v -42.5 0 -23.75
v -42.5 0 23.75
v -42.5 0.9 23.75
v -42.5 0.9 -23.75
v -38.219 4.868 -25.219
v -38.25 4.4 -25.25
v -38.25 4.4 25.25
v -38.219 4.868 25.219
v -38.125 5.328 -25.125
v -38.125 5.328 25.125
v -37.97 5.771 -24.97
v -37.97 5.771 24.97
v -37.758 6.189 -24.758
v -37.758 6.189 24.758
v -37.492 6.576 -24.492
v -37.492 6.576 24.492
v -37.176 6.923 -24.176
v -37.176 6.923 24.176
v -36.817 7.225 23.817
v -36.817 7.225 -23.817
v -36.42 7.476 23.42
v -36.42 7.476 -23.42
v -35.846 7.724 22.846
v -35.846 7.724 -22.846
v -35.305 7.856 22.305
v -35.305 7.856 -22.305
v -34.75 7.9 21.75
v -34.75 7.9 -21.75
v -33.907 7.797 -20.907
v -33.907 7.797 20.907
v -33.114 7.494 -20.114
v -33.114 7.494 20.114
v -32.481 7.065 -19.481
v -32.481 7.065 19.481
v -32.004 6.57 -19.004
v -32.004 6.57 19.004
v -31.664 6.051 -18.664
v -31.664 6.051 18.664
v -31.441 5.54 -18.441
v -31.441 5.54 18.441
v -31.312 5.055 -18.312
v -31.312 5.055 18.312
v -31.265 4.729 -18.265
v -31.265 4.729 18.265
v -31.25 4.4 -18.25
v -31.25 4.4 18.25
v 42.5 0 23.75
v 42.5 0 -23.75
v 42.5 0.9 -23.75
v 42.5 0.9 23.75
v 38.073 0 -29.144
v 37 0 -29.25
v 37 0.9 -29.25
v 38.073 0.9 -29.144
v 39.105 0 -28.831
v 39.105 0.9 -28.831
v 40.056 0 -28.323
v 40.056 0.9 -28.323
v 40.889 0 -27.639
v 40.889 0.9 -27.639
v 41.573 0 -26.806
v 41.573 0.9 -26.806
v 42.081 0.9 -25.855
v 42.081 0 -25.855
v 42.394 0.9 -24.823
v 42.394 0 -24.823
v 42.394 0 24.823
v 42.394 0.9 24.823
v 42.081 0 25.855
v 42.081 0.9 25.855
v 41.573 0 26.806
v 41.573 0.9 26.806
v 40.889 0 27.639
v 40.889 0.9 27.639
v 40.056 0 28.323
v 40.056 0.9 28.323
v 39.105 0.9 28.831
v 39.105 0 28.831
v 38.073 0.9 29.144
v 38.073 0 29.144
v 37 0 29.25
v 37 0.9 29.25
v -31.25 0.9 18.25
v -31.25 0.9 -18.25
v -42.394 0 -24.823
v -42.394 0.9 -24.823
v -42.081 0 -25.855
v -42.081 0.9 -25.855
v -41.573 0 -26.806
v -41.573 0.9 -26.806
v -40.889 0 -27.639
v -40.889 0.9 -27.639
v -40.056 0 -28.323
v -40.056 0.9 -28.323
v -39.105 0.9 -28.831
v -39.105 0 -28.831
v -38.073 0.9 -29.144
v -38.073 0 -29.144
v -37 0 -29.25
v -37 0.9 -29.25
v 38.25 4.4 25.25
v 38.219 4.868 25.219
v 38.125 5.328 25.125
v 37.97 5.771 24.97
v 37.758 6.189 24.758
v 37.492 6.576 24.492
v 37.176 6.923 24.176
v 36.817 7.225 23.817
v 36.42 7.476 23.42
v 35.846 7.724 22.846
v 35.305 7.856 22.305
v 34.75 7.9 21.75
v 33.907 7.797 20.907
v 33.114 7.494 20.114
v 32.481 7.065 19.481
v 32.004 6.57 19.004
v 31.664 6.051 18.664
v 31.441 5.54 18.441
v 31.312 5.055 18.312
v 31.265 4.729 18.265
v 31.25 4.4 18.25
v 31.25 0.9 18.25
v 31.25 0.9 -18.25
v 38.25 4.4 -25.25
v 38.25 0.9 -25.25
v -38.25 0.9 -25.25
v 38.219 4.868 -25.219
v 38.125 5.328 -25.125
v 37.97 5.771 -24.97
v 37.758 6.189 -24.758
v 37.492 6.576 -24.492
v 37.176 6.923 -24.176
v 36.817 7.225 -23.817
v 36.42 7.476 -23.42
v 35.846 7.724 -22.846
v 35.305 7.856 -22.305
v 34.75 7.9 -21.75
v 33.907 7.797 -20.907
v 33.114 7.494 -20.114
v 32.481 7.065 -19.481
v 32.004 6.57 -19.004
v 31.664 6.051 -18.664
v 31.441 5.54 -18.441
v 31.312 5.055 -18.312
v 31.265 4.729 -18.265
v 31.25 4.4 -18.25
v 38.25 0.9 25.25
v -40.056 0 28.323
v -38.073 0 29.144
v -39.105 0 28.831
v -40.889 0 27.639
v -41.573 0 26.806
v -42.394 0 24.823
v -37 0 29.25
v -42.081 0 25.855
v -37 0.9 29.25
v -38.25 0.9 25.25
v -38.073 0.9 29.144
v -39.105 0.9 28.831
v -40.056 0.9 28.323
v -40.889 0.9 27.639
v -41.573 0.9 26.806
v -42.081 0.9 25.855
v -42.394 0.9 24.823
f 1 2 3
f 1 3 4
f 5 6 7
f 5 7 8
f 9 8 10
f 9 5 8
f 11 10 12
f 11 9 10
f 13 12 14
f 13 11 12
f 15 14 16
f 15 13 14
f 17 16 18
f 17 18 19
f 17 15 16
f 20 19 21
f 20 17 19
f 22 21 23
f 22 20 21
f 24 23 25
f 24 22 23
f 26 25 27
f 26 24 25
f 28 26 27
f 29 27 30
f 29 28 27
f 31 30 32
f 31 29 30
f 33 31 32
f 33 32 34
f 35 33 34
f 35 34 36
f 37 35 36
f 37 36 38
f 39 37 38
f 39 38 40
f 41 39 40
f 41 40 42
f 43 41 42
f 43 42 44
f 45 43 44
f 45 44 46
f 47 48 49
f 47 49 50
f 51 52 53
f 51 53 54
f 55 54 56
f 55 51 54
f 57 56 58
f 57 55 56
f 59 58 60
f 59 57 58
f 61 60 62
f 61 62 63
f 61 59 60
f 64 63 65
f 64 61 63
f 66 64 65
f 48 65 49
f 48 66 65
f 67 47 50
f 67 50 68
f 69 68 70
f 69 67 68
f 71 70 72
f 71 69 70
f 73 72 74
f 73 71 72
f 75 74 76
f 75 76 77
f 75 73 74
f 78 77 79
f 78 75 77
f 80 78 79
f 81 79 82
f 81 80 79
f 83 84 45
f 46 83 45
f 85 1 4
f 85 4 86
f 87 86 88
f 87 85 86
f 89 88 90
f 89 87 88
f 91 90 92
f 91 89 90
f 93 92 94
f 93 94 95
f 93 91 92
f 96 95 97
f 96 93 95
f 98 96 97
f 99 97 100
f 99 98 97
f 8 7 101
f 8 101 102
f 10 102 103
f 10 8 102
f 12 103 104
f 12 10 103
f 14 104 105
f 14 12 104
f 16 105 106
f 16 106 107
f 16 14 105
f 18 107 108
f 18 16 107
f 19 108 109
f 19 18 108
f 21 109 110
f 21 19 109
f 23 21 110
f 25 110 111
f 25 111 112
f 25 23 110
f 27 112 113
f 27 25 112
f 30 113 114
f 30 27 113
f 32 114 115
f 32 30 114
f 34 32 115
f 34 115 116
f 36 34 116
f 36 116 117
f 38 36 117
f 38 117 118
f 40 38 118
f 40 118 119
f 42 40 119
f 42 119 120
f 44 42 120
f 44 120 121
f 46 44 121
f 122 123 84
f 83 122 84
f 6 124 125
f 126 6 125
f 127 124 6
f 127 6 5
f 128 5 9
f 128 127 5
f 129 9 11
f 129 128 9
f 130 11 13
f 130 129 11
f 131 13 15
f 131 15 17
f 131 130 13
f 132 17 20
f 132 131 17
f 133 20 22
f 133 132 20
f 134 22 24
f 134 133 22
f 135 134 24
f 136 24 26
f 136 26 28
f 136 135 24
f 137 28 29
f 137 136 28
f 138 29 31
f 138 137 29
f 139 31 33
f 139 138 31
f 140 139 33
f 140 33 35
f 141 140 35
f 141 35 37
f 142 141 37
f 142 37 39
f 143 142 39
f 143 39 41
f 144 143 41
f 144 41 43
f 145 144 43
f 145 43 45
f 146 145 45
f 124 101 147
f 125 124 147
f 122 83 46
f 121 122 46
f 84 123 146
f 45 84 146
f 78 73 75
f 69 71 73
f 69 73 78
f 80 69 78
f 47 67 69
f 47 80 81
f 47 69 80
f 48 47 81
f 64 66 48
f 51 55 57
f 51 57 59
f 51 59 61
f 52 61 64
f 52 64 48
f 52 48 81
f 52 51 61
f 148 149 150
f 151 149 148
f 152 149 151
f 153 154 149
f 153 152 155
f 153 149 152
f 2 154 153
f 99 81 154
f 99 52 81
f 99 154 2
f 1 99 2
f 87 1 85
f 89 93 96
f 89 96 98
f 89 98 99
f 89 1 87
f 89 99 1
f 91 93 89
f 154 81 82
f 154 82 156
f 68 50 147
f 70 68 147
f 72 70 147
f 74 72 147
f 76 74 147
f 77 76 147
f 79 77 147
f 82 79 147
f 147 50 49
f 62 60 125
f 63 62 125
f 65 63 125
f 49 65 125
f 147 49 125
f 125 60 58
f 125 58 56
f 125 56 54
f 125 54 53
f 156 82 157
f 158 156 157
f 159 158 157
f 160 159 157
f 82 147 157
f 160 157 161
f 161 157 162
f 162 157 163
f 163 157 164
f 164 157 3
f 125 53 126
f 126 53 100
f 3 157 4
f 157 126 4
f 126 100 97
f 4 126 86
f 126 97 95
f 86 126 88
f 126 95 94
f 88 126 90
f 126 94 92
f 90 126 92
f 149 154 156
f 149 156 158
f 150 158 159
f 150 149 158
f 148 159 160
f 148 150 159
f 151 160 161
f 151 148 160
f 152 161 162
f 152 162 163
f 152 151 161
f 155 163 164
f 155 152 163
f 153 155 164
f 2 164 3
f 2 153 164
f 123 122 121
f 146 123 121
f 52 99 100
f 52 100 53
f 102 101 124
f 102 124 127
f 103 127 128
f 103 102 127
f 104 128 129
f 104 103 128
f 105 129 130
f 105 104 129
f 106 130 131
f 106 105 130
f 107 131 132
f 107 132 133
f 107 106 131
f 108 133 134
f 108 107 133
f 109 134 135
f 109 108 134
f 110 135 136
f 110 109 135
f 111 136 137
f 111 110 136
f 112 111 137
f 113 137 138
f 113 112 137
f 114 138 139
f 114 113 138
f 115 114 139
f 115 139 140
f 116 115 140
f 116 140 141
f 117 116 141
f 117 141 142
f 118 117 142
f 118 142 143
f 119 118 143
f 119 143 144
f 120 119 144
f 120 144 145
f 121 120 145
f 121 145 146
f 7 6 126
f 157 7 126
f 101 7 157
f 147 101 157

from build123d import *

# Parameters (mm, degrees)
BOSS_EXTRUDE1_DEPTH = 0.9


with BuildPart() as part:
    # Sketch1 → Boss-Extrude1 (new body)
    with BuildSketch(Plane(origin=(0, 0, 0), x_dir=(1, 0, 0), z_dir=(0, 1, 0))):
        with BuildLine():
            Line((37, -29.25), (-37, -29.25))
            ThreePointArc((-37, -29.25), (-40.889087297, -27.639087297), (-42.5, -23.75))
            Line((-42.5, -23.75), (-42.5, 23.75))
            ThreePointArc((-42.5, 23.75), (-40.889087297, 27.639087297), (-37, 29.25))
            Line((-37, 29.25), (37, 29.25))
            ThreePointArc((37, 29.25), (40.889087297, 27.639087297), (42.5, 23.75))
            Line((42.5, 23.75), (42.5, -23.75))
            ThreePointArc((42.5, -23.75), (40.889087297, -27.639087297), (37, -29.25))
        make_face()
    extrude(amount=BOSS_EXTRUDE1_DEPTH)

    # Sweep1: sweep along a path in Sketch2
    with BuildLine(Plane(origin=(0, 0.9, 0), x_dir=(1, 0, 0), z_dir=(0, 1, 0))) as sweep1_path:
        Line((34.75, -21.75), (-34.75, -21.75))
        Line((-34.75, -21.75), (-34.75, 21.75))
        Line((-34.75, 21.75), (34.75, 21.75))
        Line((34.75, 21.75), (34.75, -21.75))
    # Sketch3 → Sweep1 (sweep)
    with BuildSketch(Plane.XY):
        with BuildLine():
            Line((-38.25, 0.9), (-31.25, 0.9))
            Line((-31.25, 0.9), (-31.25, 4.4))
            ThreePointArc((-31.25, 4.4), (-34.75, 7.9), (-38.25, 4.4))
            Line((-38.25, 4.4), (-38.25, 0.9))
        make_face()
    sweep(path=sweep1_path.line, transition=Transition.RIGHT)


solid = part.part
